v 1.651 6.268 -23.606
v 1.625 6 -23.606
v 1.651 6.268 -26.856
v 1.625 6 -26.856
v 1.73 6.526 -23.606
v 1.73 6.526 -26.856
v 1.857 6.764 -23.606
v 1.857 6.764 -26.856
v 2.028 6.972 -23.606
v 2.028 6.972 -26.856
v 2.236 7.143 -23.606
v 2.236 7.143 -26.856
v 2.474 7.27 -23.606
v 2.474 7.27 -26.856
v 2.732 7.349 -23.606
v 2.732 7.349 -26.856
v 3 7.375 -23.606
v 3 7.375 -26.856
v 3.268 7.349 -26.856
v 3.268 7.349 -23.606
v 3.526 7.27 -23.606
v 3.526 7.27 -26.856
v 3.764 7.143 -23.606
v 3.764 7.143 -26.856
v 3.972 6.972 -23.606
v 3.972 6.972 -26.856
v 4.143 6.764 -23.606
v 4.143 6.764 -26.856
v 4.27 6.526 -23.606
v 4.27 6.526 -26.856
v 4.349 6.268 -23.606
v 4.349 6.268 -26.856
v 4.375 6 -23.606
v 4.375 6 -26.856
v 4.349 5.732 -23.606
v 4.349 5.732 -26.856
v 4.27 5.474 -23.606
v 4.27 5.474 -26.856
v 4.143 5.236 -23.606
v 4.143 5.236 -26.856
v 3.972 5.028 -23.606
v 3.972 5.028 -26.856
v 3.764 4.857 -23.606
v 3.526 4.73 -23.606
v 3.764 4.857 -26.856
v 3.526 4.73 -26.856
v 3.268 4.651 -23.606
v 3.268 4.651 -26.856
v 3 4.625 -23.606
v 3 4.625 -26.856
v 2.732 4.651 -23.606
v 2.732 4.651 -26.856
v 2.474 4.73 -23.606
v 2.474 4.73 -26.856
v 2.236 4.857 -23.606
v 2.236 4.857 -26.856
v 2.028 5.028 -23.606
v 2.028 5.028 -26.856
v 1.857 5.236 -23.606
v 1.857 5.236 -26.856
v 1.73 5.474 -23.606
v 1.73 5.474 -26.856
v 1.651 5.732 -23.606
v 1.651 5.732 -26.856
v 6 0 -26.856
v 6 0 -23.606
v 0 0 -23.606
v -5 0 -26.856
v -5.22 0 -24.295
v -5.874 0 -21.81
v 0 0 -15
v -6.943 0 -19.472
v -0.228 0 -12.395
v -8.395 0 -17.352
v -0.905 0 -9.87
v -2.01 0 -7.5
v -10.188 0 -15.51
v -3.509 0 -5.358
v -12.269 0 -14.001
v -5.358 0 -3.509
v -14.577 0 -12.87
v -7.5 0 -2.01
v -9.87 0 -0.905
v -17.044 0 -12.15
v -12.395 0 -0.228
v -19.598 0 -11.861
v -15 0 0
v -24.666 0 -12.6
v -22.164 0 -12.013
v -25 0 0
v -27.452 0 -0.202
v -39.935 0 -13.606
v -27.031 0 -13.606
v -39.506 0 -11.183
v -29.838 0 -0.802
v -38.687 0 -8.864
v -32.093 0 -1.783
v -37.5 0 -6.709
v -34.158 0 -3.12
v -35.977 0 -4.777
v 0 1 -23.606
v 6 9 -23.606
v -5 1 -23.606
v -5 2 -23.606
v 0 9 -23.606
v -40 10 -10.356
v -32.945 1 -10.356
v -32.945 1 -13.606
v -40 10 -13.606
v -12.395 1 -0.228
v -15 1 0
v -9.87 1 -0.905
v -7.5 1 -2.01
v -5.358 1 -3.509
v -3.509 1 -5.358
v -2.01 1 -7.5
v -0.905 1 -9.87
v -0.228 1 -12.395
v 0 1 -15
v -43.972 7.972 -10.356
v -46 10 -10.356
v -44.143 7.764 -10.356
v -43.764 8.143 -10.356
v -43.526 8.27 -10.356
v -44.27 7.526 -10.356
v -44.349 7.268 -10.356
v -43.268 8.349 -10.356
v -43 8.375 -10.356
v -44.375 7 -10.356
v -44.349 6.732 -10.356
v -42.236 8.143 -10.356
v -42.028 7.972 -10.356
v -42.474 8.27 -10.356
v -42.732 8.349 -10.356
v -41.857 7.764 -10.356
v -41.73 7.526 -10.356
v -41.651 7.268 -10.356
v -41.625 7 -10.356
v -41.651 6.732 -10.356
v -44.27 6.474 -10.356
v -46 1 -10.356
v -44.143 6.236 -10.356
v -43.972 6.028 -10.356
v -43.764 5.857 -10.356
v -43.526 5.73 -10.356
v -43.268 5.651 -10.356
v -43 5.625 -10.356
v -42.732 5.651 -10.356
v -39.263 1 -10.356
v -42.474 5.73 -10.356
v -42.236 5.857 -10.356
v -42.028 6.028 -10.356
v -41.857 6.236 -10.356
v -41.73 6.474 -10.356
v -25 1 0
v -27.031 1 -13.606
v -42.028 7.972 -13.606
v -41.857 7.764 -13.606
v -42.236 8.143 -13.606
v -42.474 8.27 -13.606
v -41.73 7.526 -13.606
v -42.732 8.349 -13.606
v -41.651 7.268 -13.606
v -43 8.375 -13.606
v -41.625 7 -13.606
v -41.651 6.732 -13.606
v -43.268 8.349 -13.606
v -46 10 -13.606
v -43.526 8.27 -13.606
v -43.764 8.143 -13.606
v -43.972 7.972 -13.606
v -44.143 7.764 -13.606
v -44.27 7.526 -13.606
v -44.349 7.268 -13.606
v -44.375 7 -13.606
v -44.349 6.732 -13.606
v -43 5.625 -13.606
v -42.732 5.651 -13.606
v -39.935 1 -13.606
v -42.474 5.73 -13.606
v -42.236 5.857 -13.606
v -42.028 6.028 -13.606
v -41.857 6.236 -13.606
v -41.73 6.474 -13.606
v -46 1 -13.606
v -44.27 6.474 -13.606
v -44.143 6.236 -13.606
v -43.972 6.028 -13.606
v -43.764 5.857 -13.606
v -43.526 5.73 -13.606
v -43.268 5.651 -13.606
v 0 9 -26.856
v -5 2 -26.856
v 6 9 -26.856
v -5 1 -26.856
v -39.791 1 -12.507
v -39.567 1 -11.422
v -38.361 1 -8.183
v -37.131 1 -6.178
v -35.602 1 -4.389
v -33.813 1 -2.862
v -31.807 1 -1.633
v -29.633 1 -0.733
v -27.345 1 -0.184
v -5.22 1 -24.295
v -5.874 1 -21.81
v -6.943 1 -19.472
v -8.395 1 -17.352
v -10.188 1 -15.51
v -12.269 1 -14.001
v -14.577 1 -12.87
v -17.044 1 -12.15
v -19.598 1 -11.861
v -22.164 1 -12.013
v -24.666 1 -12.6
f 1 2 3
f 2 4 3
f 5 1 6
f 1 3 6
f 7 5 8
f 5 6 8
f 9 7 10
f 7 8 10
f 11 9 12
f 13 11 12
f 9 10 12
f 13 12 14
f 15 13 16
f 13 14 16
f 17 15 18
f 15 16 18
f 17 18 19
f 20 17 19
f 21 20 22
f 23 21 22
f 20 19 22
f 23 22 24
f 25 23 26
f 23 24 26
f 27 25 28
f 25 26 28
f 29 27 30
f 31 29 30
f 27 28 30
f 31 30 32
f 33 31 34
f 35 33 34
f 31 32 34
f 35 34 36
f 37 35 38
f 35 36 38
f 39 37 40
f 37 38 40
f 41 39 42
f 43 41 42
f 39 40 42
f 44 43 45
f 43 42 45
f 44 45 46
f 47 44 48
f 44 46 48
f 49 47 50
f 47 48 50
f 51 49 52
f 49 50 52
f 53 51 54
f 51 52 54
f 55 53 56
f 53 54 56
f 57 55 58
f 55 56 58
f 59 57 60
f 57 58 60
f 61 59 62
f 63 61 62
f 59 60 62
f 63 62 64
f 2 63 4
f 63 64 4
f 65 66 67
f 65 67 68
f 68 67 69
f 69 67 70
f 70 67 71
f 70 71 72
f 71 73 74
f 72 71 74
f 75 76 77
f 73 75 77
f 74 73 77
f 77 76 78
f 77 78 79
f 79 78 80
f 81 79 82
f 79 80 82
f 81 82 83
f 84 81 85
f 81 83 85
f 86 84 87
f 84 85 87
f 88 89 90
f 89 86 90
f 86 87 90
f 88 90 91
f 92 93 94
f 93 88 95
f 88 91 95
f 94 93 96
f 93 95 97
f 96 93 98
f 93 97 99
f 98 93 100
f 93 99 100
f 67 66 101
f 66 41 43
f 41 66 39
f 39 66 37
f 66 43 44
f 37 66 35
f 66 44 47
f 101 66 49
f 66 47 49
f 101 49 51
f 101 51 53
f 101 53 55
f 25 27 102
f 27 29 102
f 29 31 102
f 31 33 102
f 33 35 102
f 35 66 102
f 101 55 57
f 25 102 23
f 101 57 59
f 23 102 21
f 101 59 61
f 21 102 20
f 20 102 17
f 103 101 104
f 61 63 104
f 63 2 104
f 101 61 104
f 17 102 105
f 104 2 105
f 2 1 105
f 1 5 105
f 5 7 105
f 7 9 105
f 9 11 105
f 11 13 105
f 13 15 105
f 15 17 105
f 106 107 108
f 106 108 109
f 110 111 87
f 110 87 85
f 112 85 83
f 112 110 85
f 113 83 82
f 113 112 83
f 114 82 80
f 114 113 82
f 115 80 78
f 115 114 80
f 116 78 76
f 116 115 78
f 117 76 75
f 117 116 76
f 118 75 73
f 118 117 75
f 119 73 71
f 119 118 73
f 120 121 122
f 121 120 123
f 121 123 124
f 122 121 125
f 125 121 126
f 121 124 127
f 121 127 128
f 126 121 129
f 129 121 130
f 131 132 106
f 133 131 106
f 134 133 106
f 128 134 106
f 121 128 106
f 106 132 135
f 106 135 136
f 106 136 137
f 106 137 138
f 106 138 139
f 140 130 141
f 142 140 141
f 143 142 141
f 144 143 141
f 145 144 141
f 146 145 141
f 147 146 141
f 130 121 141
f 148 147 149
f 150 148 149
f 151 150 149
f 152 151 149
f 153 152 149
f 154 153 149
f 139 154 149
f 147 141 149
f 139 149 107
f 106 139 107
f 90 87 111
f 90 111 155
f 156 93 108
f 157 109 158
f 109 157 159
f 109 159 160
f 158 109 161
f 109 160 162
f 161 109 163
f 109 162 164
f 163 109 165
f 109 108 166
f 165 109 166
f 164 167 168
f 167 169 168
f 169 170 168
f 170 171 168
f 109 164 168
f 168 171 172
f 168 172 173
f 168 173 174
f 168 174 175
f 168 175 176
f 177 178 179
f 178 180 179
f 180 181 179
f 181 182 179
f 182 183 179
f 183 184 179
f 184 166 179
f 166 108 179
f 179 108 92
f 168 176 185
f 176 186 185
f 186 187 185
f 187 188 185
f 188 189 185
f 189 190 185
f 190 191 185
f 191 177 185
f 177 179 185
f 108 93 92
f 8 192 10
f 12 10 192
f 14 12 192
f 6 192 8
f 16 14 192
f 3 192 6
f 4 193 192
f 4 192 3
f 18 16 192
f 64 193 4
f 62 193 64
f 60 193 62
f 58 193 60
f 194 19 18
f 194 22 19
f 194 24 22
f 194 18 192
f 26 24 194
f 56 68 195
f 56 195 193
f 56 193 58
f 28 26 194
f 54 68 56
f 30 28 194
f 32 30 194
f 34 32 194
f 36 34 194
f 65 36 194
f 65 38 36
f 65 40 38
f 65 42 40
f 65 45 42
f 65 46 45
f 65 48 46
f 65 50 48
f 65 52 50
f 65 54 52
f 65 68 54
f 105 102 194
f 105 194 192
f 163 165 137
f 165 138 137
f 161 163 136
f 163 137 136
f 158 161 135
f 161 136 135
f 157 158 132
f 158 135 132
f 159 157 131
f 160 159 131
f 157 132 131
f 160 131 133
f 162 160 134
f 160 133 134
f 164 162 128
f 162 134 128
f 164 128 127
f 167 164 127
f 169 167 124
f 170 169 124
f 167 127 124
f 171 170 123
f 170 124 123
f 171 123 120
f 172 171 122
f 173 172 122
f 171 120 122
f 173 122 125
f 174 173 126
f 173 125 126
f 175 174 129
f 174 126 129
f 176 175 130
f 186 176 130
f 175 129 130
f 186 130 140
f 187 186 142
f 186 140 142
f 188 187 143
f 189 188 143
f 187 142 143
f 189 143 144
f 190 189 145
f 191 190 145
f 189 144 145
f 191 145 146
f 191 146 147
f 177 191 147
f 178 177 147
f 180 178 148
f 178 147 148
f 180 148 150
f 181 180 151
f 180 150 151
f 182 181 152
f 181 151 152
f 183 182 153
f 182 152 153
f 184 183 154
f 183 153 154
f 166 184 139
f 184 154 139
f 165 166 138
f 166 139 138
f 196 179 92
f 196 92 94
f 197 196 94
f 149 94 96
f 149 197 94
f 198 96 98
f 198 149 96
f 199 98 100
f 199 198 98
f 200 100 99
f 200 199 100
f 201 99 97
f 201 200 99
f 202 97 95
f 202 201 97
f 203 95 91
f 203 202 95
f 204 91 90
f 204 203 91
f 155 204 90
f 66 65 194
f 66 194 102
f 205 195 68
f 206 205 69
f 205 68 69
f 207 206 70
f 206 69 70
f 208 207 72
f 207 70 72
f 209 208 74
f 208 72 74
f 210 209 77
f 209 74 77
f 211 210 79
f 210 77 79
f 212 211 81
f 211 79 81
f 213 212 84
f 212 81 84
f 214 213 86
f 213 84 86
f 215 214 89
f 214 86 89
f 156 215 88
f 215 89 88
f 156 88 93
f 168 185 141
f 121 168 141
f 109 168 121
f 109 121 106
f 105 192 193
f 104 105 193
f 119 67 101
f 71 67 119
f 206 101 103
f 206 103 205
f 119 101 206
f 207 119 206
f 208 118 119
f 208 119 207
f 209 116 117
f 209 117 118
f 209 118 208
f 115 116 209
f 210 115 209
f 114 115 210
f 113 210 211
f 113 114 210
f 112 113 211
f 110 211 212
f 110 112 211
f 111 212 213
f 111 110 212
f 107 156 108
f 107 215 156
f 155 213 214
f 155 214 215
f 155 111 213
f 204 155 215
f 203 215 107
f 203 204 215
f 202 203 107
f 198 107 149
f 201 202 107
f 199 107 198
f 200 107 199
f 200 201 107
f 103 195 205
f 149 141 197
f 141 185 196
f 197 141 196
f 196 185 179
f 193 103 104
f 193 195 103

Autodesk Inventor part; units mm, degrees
ref_plane "YZ Plane" through (0, 0, 0) normal (1, 0, 0) x (0, 1, 0)
ref_plane "XZ Plane" through (0, 0, 0) normal (0, 1, 0) x (-1, 0, 0)
ref_plane "XY Plane" through (0, 0, 0) normal (0, 0, 1) x (1, 0, 0)
sketch "スケッチ1" plane through (0, 0, 0) normal (0, 1, 0) x (-1, 0, 0)
  line L0 (0, 0) -> (40, 0)
  line L1 (40, 0) -> (40, -26.8558)
  line L2 (40, -26.8558) -> (0, -26.8558)
  line L3 (0, -26.8558) -> (0, 0)
  circle A0 centre (20, -26.8558) radius 15
  line L4 (20, -26.8558) -> (20, 0)
  line L5 (40, -23.6058) -> (40, -26.8558)
  line L6 (0, -23.6058) -> (0, -26.8558)
  circle A1 centre (20, -26.8558) radius 17
  line L7 (40, -26.8558) -> (46, -26.8558)
  line L8 (46, -26.8558) -> (46, -23.6058)
  line L9 (46, -23.6058) -> (40, -23.6058)
  line L10 (40, -23.6058) -> (40, -26.8558)
  line L11 (0, -23.6058) -> (0, -26.8558)
  line L12 (0, -26.8558) -> (-6, -26.8558)
  line L13 (-6, -26.8558) -> (-6, -23.6058)
  line L14 (-6, -23.6058) -> (0, -23.6058)
  line L15 (0, -23.6058) -> (0, -26.8558)
  point P0 (35, -26.8558)
  point P1 (5, -26.8558)
  dimension "d0" = 40
  dimension "d1" = 30
  dimension "d16" = 34
  dimension "d18" = 6
  dimension "d19" = 3.25
extrude "押し出し1" add sketch "スケッチ1" along normal blind 1 contours L0 L4 A1 L2 L3 | L0 L1 L2 A1 L4 | A1 L2 A0 L4 | L4 A0 L2 A1 | L4 L2 A0 | A0 L2 L4
fillet "フィレット1" radius 15 2 edges at (-40, 0.5, 0) (0, 0.5, 0)
extrude "押し出し4" add sketch "スケッチ1" along normal blind 9 contours L3 L12 L13 L14 | L9 L8 L7 L1
sketch "スケッチ7" plane through (6, 0, -26.8558) normal (0, 0, -1) x (-1, 0, 0)
  circle A0 centre (3, 6) radius 1.375
  line L0 (6, 1) -> (6, 9) projected
  line L1 (0, 9) -> (6, 9) projected
  circle A1 centre (49.4019, 6) radius 1.375
  line L2 (46, 9) -> (52, 9) projected
  line L3 (52, 0) -> (52, 9) projected
  point P0 (6, 0)
  point P1 (3, 9)
  point P2 (52, 4.5)
  dimension "d22" = 2.75
  dimension "d23" = 3
  dimension "d24" = 3
  dimension "d25" = 2.75
  dimension "d26" = 3
  dimension "d27" = 3
extrude "押し出し5" cut sketch "スケッチ7" against normal blind 6
extrude "押し出し6" cut sketch "スケッチ1" along normal blind 1 contours L4 L2 A0 | A0 L2 L4
sketch "スケッチ9" plane through (6, 9, -26.8558) normal (0, 0, -1) x (-1, 0, 0)
  line L0 (6, -8) -> (6, 0) projected
  line L1 (6, -8) -> (11, -8)
  line L2 (11, -8) -> (11, -7)
  line L3 (11, -7) -> (6, -7)
  line L4 (6, -7) -> (6, -8)
  line L5 (6, 0) -> (11, -7)
  line L6 (41, -8) -> (41, -9) projected
  line L7 (52, 0) -> (46, 0) projected
  line L8 (46, -8) -> (46, 0) projected
  line L9 (46, -8) -> (41, -8)
  line L10 (41, -8) -> (41, -7)
  line L11 (41, -7) -> (46, -7)
  line L12 (46, -7) -> (46, -8)
  line L13 (46, 0) -> (41, -7)
  point P0 (6, -9)
  dimension "d32" = 5
  dimension "d33" = 1
  dimension "d38" = 5
extrude "押し出し7" add sketch "スケッチ9" against normal blind 3.25
sketch "スケッチ10" plane through (0, 1, 0) normal (0, 1, 0) x (1, 0, 0)
  line L0 (-35, 23.6058) -> (-40, 23.6058) projected
  line L1 (-40, 23.6058) -> (-35, 23.6058)
  line L2 (-35, 23.6058) -> (-35, 13.6058)
  line L3 (-35, 13.6058) -> (-40, 13.6058)
  line L4 (-40, 13.6058) -> (-40, 23.6058)
  line L5 (-40, 13.6058) -> (-27, 13.6058)
  line L6 (-27, 13.6058) -> (-27, 10.3558)
  line L7 (-27, 10.3558) -> (-40, 10.3558)
  line L8 (-40, 10.3558) -> (-40, 13.6058)
  line L9 (-24.5918, 17.2551) -> (-23.5955, 17.2551)
  line L10 (-23.5955, 17.2551) -> (-23.5955, 14.4656)
  line L11 (-23.5955, 14.4656) -> (-24.5918, 14.4656)
  line L12 (-24.5918, 14.4656) -> (-24.5918, 17.2551)
  arc A0 (-40, 15) -> (-25, 0) centre (-25, 15) ccw projected
  arc A1 (-40, 15) -> (-39.2629, 10.3558) centre (-25, 15) ccw
  line L13 (-40, 13.6058) -> (-46, 13.6058)
  line L14 (-46, 13.6058) -> (-46, 10.3558)
  line L15 (-46, 10.3558) -> (-40, 10.3558)
  line L16 (-40, 10.3558) -> (-40, 13.6058)
  point P0 (0, 0)
  dimension "d39" = 5
  dimension "d40" = 10
  dimension "d41" = 13
  dimension "d42" = 3.25
  dimension "d43" = 6
sketch "スケッチ11" plane through (-46, 0, -23.6058) normal (0, 0, 1) x (1, 0, 0)
  line L0 (0, 9) -> (6, 9) projected
  line L1 (6, 1) -> (6, 0) projected
  line L2 (6, 9) -> (6, 1)
  point P0 (46, 0)
extrude "押し出し8" add sketch "スケッチ10" along normal blind 9 contours L8 L15 L14 L13
sketch "スケッチ12" plane through (-46, 1, -10.3558) normal (0, 0, 1) x (1, 0, 0)
  line L0 (0, 0) -> (6, 0) projected
  line L1 (6, 0) -> (13.0551, 0)
  line L2 (0, 9) -> (6, 9) projected
  line L3 (13.0551, 0) -> (6, 9)
  line L4 (6, 0) -> (6, 9) projected
  line L5 (6, 0) -> (6, 9)
  point P0 (46, -1)
extrude "押し出し9" add sketch "スケッチ12" against normal blind 3.25
sketch "スケッチ13" plane through (-46, 1, -10.3558) normal (0, 0, 1) x (1, 0, 0)
  circle A0 centre (3, 6) radius 1.375
  line L0 (0, 9) -> (6, 9) projected
  line L1 (0, 0) -> (0, 9) projected
  point P0 (46, -1)
  dimension "d48" = 2.75
  dimension "d49" = 3
  dimension "d50" = 3
extrude "押し出し10" cut sketch "スケッチ13" against normal blind 3.25
sketch "スケッチ14" plane through (-46, 0, -23.6058) normal (0, 0, 1) x (1, 0, 0)
  line L0 (11, 1) -> (11, 2) projected
  line L1 (0, 9) -> (6, 9) projected
  line L2 (11, 1) -> (0, 1)
  line L3 (0, 1) -> (0, 9)
  line L4 (0, 9) -> (11, 9)
  line L5 (11, 9) -> (11, 1)
  line L6 (0, 1) -> (6, 1)
  line L7 (6, 1) -> (6, 0)
  line L8 (6, 0) -> (0, 0)
  line L9 (0, 0) -> (0, 1)
  point P0 (46, 0)
extrude "押し出し11" cut sketch "スケッチ14" against normal blind 9
sketch "スケッチ15" plane through (0, 1, 0) normal (0, 1, 0) x (1, 0, 0)
  arc A0 (-40, 15) -> (-39.9351, 13.6058) centre (-25, 15) ccw projected
  line L0 (-39.9351, 13.6058) -> (-27.0312, 13.6058)
  arc A1 (-35, 26.8558) -> (-5, 26.8558) centre (-20, 26.8558) ccw projected
  line L1 (-39.9351, 13.6058) -> (-32.9449, 13.6058) projected
  line L2 (-40, 26.8558) -> (-40, 15) projected
  line L3 (-39.9351, 13.6058) -> (-40, 26.8558)
  line L4 (-40, 26.8558) -> (-35, 26.8558) projected
  line L5 (-40, 26.8558) -> (-35, 26.8558)
  line L6 (-35, 26.8558) -> (-27.0312, 13.6058)
  arc A2 (-39.9351, 13.6058) -> (-39.2629, 10.3558) centre (-25, 15) ccw projected
  arc A3 (-40, 26.8558) -> (-39.9351, 13.6058) centre (466.0679, 22.7107) ccw
  point P0 (0, 0)
  point P1 (-40, 18.5657)
extrude "押し出し12" cut sketch "スケッチ15" against normal blind 9 contours L3 L4 A1 L0 | A3 L2 L3
sketch "スケッチ16" plane through (0, 1, 0) normal (0, 1, 0) x (1, 0, 0)
  arc A0 (-40, 15) -> (-39.9351, 13.6058) centre (-25, 15) ccw projected
  line L0 (-40, 18.5657) -> (-40, 15) projected
  line L1 (-39.9351, 13.6058) -> (-40, 18.5657)
  arc A1 (-40, 18.5657) -> (-39.9351, 13.6058) centre (0.7021, 16.6182) ccw
  point P0 (0, 0)
extrude "押し出し13" cut sketch "スケッチ16" against normal blind 9 contours L0 L1 A1 A0 | A0 A1 L0
sketch "スケッチ17" plane through (0, 1, 0) normal (0, 1, 0) x (1, 0, 0)
  arc A0 (-39.992, 14.51) -> (-39.9351, 13.6058) centre (-25, 15) ccw projected
  line L0 (-39.9351, 13.6058) -> (-27.0312, 13.6058) projected
  line L1 (-39.992, 14.51) -> (-39.9351, 14.51)
  line L2 (-39.9351, 14.51) -> (-39.9351, 13.6058)
  line L3 (-39.9351, 13.6058) -> (-39.992, 13.6058)
  line L4 (-39.992, 13.6058) -> (-39.992, 14.51)
  point P0 (0, 0)
extrude "押し出し14" cut sketch "スケッチ17" against normal blind 9
properties part number "PartsForRaspibase"
